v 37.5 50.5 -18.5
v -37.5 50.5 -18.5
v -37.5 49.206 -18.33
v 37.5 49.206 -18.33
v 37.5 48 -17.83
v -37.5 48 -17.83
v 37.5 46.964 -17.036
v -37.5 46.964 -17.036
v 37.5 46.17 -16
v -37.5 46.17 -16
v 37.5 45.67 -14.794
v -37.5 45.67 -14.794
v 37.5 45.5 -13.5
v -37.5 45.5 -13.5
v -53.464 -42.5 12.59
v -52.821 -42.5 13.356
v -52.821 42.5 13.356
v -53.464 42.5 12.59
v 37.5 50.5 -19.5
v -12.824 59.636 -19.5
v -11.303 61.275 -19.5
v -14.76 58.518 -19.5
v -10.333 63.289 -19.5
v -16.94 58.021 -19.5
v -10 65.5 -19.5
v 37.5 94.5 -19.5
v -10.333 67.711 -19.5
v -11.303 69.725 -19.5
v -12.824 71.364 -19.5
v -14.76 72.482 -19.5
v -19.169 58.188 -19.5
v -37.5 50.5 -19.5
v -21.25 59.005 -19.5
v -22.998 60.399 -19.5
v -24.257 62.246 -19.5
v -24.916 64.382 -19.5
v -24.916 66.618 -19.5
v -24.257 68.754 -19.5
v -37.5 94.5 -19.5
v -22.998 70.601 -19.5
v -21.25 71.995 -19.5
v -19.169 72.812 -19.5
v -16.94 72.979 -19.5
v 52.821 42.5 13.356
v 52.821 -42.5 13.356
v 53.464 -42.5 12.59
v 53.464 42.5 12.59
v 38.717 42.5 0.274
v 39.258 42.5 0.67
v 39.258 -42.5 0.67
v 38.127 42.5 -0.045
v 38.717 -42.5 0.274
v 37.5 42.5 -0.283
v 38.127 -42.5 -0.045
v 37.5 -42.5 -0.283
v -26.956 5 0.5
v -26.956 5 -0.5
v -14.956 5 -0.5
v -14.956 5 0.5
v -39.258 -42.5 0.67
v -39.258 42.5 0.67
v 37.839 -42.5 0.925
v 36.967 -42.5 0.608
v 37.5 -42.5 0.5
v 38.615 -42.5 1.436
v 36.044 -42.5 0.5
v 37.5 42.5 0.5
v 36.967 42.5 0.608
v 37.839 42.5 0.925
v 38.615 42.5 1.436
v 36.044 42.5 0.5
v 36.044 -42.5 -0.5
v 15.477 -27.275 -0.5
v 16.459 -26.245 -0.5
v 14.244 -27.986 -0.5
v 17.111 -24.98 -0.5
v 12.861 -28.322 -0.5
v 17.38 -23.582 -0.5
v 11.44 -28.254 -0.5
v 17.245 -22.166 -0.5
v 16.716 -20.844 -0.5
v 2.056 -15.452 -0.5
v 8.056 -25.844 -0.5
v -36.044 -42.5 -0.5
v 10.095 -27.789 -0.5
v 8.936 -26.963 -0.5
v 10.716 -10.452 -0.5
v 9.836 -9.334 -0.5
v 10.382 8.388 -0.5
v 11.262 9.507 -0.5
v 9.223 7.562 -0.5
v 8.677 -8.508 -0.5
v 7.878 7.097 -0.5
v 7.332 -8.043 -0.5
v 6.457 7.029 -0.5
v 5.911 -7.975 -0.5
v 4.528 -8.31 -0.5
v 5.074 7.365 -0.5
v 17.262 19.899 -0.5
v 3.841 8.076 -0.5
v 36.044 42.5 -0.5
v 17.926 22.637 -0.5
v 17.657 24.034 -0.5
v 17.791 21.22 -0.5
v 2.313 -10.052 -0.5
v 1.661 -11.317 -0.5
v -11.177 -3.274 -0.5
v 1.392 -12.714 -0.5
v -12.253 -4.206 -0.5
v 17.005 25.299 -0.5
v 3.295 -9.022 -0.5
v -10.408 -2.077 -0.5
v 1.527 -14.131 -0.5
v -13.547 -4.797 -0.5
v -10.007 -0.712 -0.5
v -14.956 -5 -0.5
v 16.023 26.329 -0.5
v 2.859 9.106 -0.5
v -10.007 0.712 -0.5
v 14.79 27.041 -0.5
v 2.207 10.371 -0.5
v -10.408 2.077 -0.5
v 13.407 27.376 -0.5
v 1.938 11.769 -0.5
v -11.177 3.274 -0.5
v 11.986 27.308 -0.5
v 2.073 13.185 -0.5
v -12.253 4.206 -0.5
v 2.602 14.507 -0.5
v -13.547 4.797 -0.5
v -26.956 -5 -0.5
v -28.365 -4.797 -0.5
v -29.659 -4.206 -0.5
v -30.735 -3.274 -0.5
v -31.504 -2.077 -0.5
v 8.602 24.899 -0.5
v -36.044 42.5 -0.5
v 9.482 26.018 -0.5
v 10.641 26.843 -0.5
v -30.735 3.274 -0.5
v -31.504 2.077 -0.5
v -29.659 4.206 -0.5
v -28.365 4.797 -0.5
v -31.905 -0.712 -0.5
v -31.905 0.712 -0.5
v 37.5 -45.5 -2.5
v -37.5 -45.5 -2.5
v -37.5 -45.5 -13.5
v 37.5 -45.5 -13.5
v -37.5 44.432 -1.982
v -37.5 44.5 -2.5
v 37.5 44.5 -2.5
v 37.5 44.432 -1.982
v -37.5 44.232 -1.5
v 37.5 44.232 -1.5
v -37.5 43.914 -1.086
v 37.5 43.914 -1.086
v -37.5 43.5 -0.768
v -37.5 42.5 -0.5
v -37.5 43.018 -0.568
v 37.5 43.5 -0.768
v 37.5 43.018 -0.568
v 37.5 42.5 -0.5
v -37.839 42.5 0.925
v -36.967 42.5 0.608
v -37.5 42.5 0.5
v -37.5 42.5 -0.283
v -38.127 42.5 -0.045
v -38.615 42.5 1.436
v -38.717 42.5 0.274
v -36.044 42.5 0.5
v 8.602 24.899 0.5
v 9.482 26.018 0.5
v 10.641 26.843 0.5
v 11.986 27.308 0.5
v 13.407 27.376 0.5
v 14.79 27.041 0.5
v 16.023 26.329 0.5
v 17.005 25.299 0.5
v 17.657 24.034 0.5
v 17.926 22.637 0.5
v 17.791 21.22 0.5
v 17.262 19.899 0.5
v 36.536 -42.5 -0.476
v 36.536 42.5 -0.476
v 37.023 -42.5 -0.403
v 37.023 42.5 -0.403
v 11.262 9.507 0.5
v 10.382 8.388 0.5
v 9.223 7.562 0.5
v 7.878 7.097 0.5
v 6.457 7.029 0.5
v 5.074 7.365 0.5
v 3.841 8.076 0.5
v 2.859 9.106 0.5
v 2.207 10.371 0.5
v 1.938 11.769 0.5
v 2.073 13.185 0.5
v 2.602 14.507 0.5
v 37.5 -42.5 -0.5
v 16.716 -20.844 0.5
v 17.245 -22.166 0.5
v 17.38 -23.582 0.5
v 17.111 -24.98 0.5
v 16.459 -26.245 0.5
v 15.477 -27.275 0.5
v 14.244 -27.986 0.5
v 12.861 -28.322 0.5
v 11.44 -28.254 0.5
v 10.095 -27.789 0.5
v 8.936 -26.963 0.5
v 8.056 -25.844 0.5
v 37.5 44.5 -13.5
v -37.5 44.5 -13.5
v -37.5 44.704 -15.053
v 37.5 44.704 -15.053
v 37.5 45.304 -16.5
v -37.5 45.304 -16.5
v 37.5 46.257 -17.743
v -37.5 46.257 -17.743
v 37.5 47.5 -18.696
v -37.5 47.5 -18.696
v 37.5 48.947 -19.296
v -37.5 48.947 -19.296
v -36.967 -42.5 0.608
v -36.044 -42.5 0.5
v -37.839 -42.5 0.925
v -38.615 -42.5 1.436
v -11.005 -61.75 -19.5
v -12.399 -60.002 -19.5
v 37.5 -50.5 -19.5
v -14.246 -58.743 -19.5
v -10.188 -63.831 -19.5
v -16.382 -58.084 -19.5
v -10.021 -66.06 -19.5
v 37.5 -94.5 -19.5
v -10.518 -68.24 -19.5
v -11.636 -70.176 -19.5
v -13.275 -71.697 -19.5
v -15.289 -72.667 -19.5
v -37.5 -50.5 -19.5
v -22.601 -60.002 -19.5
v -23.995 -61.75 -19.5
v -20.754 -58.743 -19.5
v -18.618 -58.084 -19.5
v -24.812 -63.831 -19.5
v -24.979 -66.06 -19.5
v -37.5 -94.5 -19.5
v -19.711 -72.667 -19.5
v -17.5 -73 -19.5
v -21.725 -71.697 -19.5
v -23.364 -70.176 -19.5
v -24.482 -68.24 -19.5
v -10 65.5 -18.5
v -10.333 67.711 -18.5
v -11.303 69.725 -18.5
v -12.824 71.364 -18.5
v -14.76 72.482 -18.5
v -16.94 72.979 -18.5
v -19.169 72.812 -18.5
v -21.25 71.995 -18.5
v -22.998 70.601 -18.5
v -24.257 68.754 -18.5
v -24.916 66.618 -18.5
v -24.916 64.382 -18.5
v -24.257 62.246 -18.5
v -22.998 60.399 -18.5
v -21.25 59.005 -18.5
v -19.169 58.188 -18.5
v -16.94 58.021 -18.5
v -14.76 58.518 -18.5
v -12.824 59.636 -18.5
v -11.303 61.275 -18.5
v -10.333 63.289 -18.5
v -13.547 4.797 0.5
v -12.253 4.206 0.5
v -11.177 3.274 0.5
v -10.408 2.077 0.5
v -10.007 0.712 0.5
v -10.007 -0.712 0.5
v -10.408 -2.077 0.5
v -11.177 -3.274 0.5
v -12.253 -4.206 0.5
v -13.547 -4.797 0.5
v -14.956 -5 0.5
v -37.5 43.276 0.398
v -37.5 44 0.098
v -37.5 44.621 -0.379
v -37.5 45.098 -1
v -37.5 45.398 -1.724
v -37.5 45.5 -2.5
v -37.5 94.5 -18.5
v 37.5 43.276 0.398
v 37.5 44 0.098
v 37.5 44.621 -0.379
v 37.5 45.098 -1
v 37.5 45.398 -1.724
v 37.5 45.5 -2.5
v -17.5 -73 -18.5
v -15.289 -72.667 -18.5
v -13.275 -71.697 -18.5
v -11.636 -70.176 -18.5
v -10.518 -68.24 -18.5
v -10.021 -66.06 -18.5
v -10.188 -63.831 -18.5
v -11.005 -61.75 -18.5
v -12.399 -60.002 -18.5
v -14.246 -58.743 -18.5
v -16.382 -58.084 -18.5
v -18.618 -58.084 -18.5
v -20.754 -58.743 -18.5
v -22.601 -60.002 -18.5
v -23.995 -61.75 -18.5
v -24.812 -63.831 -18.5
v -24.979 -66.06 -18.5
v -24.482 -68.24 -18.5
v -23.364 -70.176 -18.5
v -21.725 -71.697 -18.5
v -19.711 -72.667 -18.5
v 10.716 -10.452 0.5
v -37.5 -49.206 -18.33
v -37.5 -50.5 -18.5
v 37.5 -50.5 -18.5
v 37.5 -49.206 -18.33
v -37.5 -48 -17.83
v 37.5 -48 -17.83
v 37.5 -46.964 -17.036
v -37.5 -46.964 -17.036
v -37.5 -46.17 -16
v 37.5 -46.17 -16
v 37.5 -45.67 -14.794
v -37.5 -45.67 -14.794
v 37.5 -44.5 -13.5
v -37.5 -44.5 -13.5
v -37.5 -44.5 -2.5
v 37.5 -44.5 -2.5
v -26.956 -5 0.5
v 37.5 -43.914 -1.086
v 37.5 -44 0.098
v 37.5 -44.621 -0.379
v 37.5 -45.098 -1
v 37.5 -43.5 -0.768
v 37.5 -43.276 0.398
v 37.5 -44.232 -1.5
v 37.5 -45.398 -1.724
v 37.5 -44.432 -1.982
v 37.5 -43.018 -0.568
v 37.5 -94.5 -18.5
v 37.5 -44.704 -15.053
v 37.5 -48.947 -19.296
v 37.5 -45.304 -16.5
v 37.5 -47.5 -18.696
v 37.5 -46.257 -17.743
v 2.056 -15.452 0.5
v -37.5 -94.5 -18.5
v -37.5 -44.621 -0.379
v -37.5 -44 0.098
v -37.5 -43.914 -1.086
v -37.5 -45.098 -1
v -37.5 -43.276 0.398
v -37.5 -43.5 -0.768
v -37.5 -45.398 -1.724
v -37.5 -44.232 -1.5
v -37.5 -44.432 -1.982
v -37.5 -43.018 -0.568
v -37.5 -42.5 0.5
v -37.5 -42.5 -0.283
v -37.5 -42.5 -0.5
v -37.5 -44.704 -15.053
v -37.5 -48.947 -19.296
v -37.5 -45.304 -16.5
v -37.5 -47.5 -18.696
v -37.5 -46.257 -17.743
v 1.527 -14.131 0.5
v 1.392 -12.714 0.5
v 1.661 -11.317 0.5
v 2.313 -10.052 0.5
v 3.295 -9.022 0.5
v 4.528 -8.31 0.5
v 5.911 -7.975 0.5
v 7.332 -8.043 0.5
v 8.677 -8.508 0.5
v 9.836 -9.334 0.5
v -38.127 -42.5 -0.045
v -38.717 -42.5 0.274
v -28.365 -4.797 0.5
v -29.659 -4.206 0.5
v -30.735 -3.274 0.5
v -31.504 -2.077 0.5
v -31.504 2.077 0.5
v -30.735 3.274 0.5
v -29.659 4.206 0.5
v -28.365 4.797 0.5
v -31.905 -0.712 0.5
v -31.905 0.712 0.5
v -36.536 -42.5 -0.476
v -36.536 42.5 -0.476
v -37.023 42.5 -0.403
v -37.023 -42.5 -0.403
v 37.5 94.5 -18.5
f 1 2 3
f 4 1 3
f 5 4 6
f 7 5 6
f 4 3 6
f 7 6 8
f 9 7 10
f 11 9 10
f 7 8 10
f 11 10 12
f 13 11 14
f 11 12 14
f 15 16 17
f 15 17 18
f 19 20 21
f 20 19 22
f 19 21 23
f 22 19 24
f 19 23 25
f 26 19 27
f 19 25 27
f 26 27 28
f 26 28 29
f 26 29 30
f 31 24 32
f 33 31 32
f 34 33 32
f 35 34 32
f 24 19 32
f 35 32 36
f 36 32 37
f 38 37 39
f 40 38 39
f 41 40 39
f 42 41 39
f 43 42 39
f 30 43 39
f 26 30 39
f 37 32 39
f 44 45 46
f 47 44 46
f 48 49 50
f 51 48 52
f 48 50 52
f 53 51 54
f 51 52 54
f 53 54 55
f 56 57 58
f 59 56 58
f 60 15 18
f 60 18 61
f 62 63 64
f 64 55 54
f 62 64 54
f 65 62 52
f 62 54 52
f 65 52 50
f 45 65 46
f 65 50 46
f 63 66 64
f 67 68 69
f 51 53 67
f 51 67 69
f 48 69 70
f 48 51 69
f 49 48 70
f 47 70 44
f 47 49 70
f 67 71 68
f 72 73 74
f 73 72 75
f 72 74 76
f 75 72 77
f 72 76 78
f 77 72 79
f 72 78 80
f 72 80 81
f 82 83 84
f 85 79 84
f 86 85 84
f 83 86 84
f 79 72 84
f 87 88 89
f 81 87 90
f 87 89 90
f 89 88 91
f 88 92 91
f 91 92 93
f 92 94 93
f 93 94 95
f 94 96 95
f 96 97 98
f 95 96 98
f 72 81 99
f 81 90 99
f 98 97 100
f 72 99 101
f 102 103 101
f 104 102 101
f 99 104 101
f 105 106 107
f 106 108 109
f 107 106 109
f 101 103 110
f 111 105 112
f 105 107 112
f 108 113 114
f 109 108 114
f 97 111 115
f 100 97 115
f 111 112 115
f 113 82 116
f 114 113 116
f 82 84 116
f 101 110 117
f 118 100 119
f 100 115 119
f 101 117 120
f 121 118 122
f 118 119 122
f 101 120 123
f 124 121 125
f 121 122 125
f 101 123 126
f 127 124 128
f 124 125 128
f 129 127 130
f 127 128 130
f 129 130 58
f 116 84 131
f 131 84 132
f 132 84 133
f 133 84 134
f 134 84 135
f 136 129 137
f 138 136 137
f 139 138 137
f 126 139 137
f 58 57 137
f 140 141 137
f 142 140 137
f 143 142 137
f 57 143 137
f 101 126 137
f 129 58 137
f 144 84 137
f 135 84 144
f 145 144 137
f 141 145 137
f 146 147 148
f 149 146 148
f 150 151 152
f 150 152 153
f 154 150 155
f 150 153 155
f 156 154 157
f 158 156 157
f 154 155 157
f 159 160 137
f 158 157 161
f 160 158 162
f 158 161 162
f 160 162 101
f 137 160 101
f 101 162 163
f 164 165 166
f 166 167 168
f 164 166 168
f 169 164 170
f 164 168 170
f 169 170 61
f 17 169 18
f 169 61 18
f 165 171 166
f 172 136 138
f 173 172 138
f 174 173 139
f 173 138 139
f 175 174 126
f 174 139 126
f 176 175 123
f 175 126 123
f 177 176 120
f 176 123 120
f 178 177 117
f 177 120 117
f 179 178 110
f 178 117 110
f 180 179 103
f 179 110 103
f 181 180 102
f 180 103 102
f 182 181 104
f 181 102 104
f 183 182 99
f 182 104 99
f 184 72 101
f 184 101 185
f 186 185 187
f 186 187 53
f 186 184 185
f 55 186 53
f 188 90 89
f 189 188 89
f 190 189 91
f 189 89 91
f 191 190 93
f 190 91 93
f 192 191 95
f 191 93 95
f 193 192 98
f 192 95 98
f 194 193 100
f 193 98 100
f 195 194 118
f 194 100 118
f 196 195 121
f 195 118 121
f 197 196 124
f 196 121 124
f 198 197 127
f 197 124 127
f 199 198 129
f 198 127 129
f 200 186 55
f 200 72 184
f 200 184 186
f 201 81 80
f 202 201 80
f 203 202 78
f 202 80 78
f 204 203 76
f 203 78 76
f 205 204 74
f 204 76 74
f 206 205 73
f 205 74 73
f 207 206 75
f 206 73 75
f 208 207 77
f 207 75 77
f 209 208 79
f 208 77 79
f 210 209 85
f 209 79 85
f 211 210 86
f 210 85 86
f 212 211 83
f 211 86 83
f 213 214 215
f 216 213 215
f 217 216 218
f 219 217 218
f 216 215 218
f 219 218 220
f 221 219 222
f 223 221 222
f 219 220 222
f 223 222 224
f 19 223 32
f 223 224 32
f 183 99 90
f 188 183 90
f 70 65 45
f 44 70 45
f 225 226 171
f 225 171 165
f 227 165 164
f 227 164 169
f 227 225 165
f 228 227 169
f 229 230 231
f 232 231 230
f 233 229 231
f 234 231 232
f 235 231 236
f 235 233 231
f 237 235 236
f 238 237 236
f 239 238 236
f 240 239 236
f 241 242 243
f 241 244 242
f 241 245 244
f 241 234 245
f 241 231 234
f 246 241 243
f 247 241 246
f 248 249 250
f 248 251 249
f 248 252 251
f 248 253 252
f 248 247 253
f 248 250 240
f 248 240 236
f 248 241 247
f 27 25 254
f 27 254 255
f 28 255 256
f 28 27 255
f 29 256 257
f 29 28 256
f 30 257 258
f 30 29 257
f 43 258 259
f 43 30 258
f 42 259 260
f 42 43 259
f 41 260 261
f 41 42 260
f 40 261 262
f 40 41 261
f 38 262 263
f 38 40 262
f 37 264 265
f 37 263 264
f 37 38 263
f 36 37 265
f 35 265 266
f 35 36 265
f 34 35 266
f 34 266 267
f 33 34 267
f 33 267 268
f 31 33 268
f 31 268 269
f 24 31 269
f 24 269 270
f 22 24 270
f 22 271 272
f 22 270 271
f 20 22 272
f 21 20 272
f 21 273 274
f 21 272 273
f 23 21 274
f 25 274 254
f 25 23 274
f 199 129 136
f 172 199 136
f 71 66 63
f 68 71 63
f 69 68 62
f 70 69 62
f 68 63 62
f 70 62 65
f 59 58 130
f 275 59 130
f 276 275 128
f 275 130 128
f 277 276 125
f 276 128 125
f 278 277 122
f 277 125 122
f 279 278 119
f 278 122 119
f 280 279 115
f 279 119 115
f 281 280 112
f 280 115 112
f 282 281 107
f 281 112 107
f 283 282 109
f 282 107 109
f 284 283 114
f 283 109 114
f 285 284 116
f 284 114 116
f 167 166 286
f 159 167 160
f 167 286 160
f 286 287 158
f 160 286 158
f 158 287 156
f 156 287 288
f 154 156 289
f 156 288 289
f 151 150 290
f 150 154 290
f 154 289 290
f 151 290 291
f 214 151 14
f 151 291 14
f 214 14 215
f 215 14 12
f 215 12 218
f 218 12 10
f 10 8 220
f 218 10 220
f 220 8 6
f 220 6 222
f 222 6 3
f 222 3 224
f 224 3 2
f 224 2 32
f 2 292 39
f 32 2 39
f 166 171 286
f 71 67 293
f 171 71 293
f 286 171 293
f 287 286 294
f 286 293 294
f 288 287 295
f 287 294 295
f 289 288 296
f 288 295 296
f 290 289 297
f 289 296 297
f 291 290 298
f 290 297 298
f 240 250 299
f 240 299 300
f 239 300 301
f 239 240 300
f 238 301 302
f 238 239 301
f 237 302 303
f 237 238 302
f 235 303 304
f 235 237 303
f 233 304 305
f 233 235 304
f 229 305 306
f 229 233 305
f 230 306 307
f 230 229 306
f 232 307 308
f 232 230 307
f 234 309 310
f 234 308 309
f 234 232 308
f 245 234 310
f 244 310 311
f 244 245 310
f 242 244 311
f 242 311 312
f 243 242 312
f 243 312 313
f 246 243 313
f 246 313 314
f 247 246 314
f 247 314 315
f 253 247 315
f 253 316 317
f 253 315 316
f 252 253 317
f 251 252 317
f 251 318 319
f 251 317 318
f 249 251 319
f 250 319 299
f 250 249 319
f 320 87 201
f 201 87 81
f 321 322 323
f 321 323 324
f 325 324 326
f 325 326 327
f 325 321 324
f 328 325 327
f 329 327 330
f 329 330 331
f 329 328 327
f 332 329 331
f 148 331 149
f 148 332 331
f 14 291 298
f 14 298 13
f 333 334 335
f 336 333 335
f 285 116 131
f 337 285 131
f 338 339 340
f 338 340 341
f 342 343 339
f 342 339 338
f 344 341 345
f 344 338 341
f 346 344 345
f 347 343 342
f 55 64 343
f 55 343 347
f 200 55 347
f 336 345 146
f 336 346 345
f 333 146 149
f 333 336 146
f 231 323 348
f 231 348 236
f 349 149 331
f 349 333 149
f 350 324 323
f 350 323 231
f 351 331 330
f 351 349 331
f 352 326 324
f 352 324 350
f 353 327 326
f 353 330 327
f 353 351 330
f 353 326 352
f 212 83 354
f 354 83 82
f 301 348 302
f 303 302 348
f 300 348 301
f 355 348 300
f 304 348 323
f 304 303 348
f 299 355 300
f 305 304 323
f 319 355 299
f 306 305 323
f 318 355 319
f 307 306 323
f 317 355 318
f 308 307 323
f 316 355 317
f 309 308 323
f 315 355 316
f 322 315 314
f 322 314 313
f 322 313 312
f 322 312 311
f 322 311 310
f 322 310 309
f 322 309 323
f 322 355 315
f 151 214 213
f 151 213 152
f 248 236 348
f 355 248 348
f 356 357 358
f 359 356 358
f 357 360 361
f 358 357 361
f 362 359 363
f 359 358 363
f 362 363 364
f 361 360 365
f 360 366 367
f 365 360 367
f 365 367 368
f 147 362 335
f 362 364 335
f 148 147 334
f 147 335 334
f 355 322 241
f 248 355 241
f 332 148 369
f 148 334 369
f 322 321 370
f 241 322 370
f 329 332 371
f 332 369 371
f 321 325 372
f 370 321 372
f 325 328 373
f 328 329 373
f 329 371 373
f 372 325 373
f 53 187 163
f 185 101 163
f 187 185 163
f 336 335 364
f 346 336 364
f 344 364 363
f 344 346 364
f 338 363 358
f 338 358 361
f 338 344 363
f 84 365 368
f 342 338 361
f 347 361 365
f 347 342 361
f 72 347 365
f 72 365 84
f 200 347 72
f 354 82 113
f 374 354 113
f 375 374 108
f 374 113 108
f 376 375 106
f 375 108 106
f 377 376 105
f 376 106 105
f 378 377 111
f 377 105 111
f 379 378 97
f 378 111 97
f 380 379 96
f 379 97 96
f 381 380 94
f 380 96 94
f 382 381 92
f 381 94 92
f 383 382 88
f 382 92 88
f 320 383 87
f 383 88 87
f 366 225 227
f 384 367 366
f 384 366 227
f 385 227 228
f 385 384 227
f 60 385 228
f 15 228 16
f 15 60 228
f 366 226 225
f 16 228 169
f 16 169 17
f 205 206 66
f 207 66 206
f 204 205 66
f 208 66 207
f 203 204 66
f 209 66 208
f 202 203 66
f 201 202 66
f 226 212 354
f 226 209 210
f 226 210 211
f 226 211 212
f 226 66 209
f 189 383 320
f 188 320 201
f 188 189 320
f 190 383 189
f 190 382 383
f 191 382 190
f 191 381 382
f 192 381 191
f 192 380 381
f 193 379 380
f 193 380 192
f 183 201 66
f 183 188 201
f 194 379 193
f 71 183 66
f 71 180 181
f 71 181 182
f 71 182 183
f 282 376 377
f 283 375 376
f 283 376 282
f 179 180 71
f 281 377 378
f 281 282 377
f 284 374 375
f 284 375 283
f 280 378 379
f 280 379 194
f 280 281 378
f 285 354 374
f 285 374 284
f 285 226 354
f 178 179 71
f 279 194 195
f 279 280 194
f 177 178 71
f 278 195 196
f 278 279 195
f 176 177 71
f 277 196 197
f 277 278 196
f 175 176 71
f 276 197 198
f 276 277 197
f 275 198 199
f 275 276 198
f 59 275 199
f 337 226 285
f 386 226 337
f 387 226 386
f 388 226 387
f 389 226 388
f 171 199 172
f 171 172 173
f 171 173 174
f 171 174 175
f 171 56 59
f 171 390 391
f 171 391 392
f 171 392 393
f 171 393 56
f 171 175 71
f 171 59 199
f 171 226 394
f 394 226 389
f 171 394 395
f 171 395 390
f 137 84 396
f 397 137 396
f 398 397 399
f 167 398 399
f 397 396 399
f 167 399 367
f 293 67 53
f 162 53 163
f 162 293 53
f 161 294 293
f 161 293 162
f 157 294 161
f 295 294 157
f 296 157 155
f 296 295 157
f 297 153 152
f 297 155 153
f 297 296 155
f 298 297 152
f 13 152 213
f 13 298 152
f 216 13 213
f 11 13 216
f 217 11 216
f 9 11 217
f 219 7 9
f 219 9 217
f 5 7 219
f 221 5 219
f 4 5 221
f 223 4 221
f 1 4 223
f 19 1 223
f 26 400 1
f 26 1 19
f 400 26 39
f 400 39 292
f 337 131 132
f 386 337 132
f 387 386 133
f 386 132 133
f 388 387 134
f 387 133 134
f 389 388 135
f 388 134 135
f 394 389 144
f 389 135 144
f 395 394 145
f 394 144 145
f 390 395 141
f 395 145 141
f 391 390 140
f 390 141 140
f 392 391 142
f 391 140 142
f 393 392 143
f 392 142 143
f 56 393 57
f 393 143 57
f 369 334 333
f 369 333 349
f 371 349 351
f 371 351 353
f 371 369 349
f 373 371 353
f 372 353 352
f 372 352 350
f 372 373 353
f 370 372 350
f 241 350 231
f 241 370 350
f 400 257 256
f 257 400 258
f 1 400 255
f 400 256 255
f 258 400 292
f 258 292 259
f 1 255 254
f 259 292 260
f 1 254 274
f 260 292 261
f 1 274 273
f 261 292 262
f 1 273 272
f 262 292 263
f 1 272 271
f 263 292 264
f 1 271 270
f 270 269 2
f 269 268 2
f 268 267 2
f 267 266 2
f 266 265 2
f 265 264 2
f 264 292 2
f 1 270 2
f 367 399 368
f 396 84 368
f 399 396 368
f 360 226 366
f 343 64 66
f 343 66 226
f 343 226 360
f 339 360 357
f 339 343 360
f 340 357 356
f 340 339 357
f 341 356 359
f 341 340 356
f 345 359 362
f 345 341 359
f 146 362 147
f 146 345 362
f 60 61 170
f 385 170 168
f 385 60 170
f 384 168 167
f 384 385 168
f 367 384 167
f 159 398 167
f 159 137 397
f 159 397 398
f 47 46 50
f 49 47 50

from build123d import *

# Parameters (mm, degrees)
BASE_FLANGE1_START           = -0.5
BASE_FLANGE1_OUTLINE_W       = 91
BASE_FLANGE1_OUTLINE_H       = 75
BASE_FLANGE1_DEPTH           = 1
EDGE_FLANGE1_STRIP_W         = 8
EDGE_FLANGE1_STRIP_H         = 1
EDGE_FLANGE1_STRIP_CUT_DEPTH = 75
EDGE_FLANGE1_DEPTH           = 75
EDGE_FLANGE2_STRIP_W         = 14
EDGE_FLANGE2_STRIP_H         = 1
EDGE_FLANGE2_STRIP_CUT_DEPTH = 75
EDGE_FLANGE2_DEPTH           = 75
EDGE_FLANGE3_START           = -42.5
EDGE_FLANGE3_DEPTH           = 85
EDGE_FLANGE3_2_DEPTH         = 85
CUT_EXTRUDE1_DEPTH           = 111.402059319
CUT_EXTRUDE1_DEPTH_BACK      = 111.402059319
CUT_EXTRUDE2_DEPTH           = 114.152126139
CUT_EXTRUDE2_DEPTH_BACK      = 114.152126139
SKETCH16_R                   = 7.5


# Read off the part's stored shape, not the designer's step: Base-Flange1, Edge-Flange3
# Sheet-metal steps are written as plain solids
with BuildPart() as part:
    # Base-Flange1 outline → Base-Flange1 (new body)
    with BuildSketch(Plane(origin=(0, 0, 0), x_dir=(0, 1, 0), z_dir=(0, 0, 1)).offset(BASE_FLANGE1_START)):
        Rectangle(BASE_FLANGE1_OUTLINE_W, BASE_FLANGE1_OUTLINE_H)
    extrude(amount=BASE_FLANGE1_DEPTH)

    # Edge-Flange1 strip (across the edge) → Edge-Flange1 strip cut (cut)
    with BuildSketch(Plane(origin=(37.5, -45.5, -0.5), x_dir=(0, 1, 0), z_dir=(-1, 0, 0))):
        with Locations((-1, -0.5)):
            Rectangle(EDGE_FLANGE1_STRIP_W, EDGE_FLANGE1_STRIP_H)
    edge_flange1_strip_cut = extrude(amount=EDGE_FLANGE1_STRIP_CUT_DEPTH, mode=Mode.SUBTRACT)

    # Edge-Flange1 section (across the edge) → Edge-Flange1 (add)
    with BuildSketch(Plane(origin=(37.5, -45.5, -0.5), x_dir=(0, 1, 0), z_dir=(-1, 0, 0))):
        with BuildLine():
            Line((0, 2), (0, 19))
            Line((0, 19), (1, 19))
            Line((1, 19), (1, 2))
            ThreePointArc((1, 2), (1.585786438, 0.585786438), (3, 0))
            Line((3, 0), (3, -1))
            ThreePointArc((3, -1), (0.878679656, -0.121320344), (0, 2))
        make_face()
    edge_flange1 = extrude(amount=EDGE_FLANGE1_DEPTH)

    # Edge-Flange2 strip (across the edge) → Edge-Flange2 strip cut (cut)
    with BuildSketch(Plane(origin=(-37.5, -45.5, -19.5), x_dir=(0, 0, 1), z_dir=(1, 0, 0))):
        with Locations((-1, -0.5)):
            Rectangle(EDGE_FLANGE2_STRIP_W, EDGE_FLANGE2_STRIP_H)
    edge_flange2_strip_cut = extrude(amount=EDGE_FLANGE2_STRIP_CUT_DEPTH, mode=Mode.SUBTRACT)

    # Edge-Flange2 section (across the edge) → Edge-Flange2 (add)
    with BuildSketch(Plane(origin=(-37.5, -45.5, -19.5), x_dir=(0, 0, 1), z_dir=(1, 0, 0))):
        with BuildLine():
            Line((0, 5), (0, 49))
            Line((0, 49), (1, 49))
            Line((1, 49), (1, 5))
            ThreePointArc((1, 5), (2.464466094, 1.464466094), (6, 0))
            Line((6, 0), (6, -1))
            ThreePointArc((6, -1), (1.757359313, 0.757359313), (0, 5))
        make_face()
    edge_flange2 = extrude(amount=EDGE_FLANGE2_DEPTH)

    # Mirror1: Edge-Flange1 strip cut, Edge-Flange1, Edge-Flange2 strip cut, Edge-Flange2 across plane
    add(edge_flange1_strip_cut.mirror(Plane.ZX), mode=Mode.SUBTRACT)
    add(edge_flange1.mirror(Plane.ZX))
    add(edge_flange2_strip_cut.mirror(Plane.ZX), mode=Mode.SUBTRACT)
    add(edge_flange2.mirror(Plane.ZX))

    # Edge-Flange3 outline → Edge-Flange3 (cut)
    with BuildSketch(Plane(origin=(0, 0, 0), x_dir=(1, 0, 0), z_dir=(0, 1, 0)).offset(EDGE_FLANGE3_START)):
        with BuildLine():
            ThreePointArc((36.044119063, 0.5), (36.780075537, 0.44554022), (37.5, 0.283347228))
            Line((37.5, 0.283347228), (37.5, 0.5))
            Line((37.5, 0.5), (36.044119063, 0.5))
        make_face()
    edge_flange3 = extrude(amount=EDGE_FLANGE3_DEPTH, mode=Mode.SUBTRACT)

    # Edge-Flange3 2 outline → Edge-Flange3 2 (add)
    with BuildSketch(Plane(origin=(0, 0, 0), x_dir=(1, 0, 0), z_dir=(0, 1, 0)).offset(EDGE_FLANGE3_START)):
        with BuildLine():
            Line((53.463676472, -12.589707751), (39.258057111, -0.669777784))
            ThreePointArc((39.258057111, -0.669777784), (38.427166306, -0.104424288), (37.5, 0.283347228))
            Line((37.5, 0.283347228), (37.5, -0.5))
            Line((37.5, -0.5), (36.044119063, -0.5))
            ThreePointArc((36.044119063, -0.5), (37.412199636, -0.741229517), (38.615269502, -1.435822228))
            Line((38.615269502, -1.435822228), (52.820888862, -13.355752194))
            Line((52.820888862, -13.355752194), (53.463676472, -12.589707751))
        make_face()
    edge_flange3_2 = extrude(amount=EDGE_FLANGE3_2_DEPTH)

    # Mirror2: Edge-Flange3, Edge-Flange3 2 across plane
    add(edge_flange3.mirror(Plane(origin=(0, 0, 0), x_dir=(0, 0, 1), z_dir=(1, 0, 0))), mode=Mode.SUBTRACT)
    add(edge_flange3_2.mirror(Plane(origin=(0, 0, 0), x_dir=(0, 0, 1), z_dir=(1, 0, 0))))

    # Sketch15 → Cut-Extrude1 (cut, two sides: drawn at the far end of the back side and taken through both)
    with BuildSketch(Plane.XY.offset(0.5).offset(-CUT_EXTRUDE1_DEPTH_BACK)):
        with BuildLine():
            Line((-26.955880937, 5), (-14.955880937, 5))
            ThreePointArc((-14.955880937, 5), (-9.955880937, 0), (-14.955880937, -5))
            Line((-14.955880937, -5), (-26.955880937, -5))
            ThreePointArc((-26.955880937, -5), (-31.955880937, 0), (-26.955880937, 5))
        make_face()
        with BuildLine():
            Line((17.262112136, 19.898855266), (11.262112136, 9.50655042))
            ThreePointArc((11.262112136, 9.50655042), (4.431985117, 7.676423401), (2.601858098, 14.50655042))
            Line((2.601858098, 14.50655042), (8.601858098, 24.898855266))
            ThreePointArc((8.601858098, 24.898855266), (15.431985117, 26.728982285), (17.262112136, 19.898855266))
        make_face()
        with BuildLine():
            Line((8.055902747, -25.844477673), (2.055902747, -15.452172827))
            ThreePointArc((2.055902747, -15.452172827), (3.886029766, -8.622045809), (10.716156785, -10.452172827))
            Line((10.716156785, -10.452172827), (16.716156785, -20.844477673))
            ThreePointArc((16.716156785, -20.844477673), (14.886029766, -27.674604692), (8.055902747, -25.844477673))
        make_face()
    extrude(amount=CUT_EXTRUDE1_DEPTH + CUT_EXTRUDE1_DEPTH_BACK, mode=Mode.SUBTRACT)

    # Sketch16 → Cut-Extrude2 (cut, two sides: drawn at the far end of the back side and taken through both)
    with BuildSketch(Plane.XY.offset(-18.5).offset(-CUT_EXTRUDE2_DEPTH_BACK)):
        with Locations((-17.5, 65.5)):
            Circle(SKETCH16_R)
        with Locations(Location((-17.5, -65.5, 0), (0, 0, 270))):
            Circle(SKETCH16_R)
    extrude(amount=CUT_EXTRUDE2_DEPTH + CUT_EXTRUDE2_DEPTH_BACK, mode=Mode.SUBTRACT)


solid = part.part
